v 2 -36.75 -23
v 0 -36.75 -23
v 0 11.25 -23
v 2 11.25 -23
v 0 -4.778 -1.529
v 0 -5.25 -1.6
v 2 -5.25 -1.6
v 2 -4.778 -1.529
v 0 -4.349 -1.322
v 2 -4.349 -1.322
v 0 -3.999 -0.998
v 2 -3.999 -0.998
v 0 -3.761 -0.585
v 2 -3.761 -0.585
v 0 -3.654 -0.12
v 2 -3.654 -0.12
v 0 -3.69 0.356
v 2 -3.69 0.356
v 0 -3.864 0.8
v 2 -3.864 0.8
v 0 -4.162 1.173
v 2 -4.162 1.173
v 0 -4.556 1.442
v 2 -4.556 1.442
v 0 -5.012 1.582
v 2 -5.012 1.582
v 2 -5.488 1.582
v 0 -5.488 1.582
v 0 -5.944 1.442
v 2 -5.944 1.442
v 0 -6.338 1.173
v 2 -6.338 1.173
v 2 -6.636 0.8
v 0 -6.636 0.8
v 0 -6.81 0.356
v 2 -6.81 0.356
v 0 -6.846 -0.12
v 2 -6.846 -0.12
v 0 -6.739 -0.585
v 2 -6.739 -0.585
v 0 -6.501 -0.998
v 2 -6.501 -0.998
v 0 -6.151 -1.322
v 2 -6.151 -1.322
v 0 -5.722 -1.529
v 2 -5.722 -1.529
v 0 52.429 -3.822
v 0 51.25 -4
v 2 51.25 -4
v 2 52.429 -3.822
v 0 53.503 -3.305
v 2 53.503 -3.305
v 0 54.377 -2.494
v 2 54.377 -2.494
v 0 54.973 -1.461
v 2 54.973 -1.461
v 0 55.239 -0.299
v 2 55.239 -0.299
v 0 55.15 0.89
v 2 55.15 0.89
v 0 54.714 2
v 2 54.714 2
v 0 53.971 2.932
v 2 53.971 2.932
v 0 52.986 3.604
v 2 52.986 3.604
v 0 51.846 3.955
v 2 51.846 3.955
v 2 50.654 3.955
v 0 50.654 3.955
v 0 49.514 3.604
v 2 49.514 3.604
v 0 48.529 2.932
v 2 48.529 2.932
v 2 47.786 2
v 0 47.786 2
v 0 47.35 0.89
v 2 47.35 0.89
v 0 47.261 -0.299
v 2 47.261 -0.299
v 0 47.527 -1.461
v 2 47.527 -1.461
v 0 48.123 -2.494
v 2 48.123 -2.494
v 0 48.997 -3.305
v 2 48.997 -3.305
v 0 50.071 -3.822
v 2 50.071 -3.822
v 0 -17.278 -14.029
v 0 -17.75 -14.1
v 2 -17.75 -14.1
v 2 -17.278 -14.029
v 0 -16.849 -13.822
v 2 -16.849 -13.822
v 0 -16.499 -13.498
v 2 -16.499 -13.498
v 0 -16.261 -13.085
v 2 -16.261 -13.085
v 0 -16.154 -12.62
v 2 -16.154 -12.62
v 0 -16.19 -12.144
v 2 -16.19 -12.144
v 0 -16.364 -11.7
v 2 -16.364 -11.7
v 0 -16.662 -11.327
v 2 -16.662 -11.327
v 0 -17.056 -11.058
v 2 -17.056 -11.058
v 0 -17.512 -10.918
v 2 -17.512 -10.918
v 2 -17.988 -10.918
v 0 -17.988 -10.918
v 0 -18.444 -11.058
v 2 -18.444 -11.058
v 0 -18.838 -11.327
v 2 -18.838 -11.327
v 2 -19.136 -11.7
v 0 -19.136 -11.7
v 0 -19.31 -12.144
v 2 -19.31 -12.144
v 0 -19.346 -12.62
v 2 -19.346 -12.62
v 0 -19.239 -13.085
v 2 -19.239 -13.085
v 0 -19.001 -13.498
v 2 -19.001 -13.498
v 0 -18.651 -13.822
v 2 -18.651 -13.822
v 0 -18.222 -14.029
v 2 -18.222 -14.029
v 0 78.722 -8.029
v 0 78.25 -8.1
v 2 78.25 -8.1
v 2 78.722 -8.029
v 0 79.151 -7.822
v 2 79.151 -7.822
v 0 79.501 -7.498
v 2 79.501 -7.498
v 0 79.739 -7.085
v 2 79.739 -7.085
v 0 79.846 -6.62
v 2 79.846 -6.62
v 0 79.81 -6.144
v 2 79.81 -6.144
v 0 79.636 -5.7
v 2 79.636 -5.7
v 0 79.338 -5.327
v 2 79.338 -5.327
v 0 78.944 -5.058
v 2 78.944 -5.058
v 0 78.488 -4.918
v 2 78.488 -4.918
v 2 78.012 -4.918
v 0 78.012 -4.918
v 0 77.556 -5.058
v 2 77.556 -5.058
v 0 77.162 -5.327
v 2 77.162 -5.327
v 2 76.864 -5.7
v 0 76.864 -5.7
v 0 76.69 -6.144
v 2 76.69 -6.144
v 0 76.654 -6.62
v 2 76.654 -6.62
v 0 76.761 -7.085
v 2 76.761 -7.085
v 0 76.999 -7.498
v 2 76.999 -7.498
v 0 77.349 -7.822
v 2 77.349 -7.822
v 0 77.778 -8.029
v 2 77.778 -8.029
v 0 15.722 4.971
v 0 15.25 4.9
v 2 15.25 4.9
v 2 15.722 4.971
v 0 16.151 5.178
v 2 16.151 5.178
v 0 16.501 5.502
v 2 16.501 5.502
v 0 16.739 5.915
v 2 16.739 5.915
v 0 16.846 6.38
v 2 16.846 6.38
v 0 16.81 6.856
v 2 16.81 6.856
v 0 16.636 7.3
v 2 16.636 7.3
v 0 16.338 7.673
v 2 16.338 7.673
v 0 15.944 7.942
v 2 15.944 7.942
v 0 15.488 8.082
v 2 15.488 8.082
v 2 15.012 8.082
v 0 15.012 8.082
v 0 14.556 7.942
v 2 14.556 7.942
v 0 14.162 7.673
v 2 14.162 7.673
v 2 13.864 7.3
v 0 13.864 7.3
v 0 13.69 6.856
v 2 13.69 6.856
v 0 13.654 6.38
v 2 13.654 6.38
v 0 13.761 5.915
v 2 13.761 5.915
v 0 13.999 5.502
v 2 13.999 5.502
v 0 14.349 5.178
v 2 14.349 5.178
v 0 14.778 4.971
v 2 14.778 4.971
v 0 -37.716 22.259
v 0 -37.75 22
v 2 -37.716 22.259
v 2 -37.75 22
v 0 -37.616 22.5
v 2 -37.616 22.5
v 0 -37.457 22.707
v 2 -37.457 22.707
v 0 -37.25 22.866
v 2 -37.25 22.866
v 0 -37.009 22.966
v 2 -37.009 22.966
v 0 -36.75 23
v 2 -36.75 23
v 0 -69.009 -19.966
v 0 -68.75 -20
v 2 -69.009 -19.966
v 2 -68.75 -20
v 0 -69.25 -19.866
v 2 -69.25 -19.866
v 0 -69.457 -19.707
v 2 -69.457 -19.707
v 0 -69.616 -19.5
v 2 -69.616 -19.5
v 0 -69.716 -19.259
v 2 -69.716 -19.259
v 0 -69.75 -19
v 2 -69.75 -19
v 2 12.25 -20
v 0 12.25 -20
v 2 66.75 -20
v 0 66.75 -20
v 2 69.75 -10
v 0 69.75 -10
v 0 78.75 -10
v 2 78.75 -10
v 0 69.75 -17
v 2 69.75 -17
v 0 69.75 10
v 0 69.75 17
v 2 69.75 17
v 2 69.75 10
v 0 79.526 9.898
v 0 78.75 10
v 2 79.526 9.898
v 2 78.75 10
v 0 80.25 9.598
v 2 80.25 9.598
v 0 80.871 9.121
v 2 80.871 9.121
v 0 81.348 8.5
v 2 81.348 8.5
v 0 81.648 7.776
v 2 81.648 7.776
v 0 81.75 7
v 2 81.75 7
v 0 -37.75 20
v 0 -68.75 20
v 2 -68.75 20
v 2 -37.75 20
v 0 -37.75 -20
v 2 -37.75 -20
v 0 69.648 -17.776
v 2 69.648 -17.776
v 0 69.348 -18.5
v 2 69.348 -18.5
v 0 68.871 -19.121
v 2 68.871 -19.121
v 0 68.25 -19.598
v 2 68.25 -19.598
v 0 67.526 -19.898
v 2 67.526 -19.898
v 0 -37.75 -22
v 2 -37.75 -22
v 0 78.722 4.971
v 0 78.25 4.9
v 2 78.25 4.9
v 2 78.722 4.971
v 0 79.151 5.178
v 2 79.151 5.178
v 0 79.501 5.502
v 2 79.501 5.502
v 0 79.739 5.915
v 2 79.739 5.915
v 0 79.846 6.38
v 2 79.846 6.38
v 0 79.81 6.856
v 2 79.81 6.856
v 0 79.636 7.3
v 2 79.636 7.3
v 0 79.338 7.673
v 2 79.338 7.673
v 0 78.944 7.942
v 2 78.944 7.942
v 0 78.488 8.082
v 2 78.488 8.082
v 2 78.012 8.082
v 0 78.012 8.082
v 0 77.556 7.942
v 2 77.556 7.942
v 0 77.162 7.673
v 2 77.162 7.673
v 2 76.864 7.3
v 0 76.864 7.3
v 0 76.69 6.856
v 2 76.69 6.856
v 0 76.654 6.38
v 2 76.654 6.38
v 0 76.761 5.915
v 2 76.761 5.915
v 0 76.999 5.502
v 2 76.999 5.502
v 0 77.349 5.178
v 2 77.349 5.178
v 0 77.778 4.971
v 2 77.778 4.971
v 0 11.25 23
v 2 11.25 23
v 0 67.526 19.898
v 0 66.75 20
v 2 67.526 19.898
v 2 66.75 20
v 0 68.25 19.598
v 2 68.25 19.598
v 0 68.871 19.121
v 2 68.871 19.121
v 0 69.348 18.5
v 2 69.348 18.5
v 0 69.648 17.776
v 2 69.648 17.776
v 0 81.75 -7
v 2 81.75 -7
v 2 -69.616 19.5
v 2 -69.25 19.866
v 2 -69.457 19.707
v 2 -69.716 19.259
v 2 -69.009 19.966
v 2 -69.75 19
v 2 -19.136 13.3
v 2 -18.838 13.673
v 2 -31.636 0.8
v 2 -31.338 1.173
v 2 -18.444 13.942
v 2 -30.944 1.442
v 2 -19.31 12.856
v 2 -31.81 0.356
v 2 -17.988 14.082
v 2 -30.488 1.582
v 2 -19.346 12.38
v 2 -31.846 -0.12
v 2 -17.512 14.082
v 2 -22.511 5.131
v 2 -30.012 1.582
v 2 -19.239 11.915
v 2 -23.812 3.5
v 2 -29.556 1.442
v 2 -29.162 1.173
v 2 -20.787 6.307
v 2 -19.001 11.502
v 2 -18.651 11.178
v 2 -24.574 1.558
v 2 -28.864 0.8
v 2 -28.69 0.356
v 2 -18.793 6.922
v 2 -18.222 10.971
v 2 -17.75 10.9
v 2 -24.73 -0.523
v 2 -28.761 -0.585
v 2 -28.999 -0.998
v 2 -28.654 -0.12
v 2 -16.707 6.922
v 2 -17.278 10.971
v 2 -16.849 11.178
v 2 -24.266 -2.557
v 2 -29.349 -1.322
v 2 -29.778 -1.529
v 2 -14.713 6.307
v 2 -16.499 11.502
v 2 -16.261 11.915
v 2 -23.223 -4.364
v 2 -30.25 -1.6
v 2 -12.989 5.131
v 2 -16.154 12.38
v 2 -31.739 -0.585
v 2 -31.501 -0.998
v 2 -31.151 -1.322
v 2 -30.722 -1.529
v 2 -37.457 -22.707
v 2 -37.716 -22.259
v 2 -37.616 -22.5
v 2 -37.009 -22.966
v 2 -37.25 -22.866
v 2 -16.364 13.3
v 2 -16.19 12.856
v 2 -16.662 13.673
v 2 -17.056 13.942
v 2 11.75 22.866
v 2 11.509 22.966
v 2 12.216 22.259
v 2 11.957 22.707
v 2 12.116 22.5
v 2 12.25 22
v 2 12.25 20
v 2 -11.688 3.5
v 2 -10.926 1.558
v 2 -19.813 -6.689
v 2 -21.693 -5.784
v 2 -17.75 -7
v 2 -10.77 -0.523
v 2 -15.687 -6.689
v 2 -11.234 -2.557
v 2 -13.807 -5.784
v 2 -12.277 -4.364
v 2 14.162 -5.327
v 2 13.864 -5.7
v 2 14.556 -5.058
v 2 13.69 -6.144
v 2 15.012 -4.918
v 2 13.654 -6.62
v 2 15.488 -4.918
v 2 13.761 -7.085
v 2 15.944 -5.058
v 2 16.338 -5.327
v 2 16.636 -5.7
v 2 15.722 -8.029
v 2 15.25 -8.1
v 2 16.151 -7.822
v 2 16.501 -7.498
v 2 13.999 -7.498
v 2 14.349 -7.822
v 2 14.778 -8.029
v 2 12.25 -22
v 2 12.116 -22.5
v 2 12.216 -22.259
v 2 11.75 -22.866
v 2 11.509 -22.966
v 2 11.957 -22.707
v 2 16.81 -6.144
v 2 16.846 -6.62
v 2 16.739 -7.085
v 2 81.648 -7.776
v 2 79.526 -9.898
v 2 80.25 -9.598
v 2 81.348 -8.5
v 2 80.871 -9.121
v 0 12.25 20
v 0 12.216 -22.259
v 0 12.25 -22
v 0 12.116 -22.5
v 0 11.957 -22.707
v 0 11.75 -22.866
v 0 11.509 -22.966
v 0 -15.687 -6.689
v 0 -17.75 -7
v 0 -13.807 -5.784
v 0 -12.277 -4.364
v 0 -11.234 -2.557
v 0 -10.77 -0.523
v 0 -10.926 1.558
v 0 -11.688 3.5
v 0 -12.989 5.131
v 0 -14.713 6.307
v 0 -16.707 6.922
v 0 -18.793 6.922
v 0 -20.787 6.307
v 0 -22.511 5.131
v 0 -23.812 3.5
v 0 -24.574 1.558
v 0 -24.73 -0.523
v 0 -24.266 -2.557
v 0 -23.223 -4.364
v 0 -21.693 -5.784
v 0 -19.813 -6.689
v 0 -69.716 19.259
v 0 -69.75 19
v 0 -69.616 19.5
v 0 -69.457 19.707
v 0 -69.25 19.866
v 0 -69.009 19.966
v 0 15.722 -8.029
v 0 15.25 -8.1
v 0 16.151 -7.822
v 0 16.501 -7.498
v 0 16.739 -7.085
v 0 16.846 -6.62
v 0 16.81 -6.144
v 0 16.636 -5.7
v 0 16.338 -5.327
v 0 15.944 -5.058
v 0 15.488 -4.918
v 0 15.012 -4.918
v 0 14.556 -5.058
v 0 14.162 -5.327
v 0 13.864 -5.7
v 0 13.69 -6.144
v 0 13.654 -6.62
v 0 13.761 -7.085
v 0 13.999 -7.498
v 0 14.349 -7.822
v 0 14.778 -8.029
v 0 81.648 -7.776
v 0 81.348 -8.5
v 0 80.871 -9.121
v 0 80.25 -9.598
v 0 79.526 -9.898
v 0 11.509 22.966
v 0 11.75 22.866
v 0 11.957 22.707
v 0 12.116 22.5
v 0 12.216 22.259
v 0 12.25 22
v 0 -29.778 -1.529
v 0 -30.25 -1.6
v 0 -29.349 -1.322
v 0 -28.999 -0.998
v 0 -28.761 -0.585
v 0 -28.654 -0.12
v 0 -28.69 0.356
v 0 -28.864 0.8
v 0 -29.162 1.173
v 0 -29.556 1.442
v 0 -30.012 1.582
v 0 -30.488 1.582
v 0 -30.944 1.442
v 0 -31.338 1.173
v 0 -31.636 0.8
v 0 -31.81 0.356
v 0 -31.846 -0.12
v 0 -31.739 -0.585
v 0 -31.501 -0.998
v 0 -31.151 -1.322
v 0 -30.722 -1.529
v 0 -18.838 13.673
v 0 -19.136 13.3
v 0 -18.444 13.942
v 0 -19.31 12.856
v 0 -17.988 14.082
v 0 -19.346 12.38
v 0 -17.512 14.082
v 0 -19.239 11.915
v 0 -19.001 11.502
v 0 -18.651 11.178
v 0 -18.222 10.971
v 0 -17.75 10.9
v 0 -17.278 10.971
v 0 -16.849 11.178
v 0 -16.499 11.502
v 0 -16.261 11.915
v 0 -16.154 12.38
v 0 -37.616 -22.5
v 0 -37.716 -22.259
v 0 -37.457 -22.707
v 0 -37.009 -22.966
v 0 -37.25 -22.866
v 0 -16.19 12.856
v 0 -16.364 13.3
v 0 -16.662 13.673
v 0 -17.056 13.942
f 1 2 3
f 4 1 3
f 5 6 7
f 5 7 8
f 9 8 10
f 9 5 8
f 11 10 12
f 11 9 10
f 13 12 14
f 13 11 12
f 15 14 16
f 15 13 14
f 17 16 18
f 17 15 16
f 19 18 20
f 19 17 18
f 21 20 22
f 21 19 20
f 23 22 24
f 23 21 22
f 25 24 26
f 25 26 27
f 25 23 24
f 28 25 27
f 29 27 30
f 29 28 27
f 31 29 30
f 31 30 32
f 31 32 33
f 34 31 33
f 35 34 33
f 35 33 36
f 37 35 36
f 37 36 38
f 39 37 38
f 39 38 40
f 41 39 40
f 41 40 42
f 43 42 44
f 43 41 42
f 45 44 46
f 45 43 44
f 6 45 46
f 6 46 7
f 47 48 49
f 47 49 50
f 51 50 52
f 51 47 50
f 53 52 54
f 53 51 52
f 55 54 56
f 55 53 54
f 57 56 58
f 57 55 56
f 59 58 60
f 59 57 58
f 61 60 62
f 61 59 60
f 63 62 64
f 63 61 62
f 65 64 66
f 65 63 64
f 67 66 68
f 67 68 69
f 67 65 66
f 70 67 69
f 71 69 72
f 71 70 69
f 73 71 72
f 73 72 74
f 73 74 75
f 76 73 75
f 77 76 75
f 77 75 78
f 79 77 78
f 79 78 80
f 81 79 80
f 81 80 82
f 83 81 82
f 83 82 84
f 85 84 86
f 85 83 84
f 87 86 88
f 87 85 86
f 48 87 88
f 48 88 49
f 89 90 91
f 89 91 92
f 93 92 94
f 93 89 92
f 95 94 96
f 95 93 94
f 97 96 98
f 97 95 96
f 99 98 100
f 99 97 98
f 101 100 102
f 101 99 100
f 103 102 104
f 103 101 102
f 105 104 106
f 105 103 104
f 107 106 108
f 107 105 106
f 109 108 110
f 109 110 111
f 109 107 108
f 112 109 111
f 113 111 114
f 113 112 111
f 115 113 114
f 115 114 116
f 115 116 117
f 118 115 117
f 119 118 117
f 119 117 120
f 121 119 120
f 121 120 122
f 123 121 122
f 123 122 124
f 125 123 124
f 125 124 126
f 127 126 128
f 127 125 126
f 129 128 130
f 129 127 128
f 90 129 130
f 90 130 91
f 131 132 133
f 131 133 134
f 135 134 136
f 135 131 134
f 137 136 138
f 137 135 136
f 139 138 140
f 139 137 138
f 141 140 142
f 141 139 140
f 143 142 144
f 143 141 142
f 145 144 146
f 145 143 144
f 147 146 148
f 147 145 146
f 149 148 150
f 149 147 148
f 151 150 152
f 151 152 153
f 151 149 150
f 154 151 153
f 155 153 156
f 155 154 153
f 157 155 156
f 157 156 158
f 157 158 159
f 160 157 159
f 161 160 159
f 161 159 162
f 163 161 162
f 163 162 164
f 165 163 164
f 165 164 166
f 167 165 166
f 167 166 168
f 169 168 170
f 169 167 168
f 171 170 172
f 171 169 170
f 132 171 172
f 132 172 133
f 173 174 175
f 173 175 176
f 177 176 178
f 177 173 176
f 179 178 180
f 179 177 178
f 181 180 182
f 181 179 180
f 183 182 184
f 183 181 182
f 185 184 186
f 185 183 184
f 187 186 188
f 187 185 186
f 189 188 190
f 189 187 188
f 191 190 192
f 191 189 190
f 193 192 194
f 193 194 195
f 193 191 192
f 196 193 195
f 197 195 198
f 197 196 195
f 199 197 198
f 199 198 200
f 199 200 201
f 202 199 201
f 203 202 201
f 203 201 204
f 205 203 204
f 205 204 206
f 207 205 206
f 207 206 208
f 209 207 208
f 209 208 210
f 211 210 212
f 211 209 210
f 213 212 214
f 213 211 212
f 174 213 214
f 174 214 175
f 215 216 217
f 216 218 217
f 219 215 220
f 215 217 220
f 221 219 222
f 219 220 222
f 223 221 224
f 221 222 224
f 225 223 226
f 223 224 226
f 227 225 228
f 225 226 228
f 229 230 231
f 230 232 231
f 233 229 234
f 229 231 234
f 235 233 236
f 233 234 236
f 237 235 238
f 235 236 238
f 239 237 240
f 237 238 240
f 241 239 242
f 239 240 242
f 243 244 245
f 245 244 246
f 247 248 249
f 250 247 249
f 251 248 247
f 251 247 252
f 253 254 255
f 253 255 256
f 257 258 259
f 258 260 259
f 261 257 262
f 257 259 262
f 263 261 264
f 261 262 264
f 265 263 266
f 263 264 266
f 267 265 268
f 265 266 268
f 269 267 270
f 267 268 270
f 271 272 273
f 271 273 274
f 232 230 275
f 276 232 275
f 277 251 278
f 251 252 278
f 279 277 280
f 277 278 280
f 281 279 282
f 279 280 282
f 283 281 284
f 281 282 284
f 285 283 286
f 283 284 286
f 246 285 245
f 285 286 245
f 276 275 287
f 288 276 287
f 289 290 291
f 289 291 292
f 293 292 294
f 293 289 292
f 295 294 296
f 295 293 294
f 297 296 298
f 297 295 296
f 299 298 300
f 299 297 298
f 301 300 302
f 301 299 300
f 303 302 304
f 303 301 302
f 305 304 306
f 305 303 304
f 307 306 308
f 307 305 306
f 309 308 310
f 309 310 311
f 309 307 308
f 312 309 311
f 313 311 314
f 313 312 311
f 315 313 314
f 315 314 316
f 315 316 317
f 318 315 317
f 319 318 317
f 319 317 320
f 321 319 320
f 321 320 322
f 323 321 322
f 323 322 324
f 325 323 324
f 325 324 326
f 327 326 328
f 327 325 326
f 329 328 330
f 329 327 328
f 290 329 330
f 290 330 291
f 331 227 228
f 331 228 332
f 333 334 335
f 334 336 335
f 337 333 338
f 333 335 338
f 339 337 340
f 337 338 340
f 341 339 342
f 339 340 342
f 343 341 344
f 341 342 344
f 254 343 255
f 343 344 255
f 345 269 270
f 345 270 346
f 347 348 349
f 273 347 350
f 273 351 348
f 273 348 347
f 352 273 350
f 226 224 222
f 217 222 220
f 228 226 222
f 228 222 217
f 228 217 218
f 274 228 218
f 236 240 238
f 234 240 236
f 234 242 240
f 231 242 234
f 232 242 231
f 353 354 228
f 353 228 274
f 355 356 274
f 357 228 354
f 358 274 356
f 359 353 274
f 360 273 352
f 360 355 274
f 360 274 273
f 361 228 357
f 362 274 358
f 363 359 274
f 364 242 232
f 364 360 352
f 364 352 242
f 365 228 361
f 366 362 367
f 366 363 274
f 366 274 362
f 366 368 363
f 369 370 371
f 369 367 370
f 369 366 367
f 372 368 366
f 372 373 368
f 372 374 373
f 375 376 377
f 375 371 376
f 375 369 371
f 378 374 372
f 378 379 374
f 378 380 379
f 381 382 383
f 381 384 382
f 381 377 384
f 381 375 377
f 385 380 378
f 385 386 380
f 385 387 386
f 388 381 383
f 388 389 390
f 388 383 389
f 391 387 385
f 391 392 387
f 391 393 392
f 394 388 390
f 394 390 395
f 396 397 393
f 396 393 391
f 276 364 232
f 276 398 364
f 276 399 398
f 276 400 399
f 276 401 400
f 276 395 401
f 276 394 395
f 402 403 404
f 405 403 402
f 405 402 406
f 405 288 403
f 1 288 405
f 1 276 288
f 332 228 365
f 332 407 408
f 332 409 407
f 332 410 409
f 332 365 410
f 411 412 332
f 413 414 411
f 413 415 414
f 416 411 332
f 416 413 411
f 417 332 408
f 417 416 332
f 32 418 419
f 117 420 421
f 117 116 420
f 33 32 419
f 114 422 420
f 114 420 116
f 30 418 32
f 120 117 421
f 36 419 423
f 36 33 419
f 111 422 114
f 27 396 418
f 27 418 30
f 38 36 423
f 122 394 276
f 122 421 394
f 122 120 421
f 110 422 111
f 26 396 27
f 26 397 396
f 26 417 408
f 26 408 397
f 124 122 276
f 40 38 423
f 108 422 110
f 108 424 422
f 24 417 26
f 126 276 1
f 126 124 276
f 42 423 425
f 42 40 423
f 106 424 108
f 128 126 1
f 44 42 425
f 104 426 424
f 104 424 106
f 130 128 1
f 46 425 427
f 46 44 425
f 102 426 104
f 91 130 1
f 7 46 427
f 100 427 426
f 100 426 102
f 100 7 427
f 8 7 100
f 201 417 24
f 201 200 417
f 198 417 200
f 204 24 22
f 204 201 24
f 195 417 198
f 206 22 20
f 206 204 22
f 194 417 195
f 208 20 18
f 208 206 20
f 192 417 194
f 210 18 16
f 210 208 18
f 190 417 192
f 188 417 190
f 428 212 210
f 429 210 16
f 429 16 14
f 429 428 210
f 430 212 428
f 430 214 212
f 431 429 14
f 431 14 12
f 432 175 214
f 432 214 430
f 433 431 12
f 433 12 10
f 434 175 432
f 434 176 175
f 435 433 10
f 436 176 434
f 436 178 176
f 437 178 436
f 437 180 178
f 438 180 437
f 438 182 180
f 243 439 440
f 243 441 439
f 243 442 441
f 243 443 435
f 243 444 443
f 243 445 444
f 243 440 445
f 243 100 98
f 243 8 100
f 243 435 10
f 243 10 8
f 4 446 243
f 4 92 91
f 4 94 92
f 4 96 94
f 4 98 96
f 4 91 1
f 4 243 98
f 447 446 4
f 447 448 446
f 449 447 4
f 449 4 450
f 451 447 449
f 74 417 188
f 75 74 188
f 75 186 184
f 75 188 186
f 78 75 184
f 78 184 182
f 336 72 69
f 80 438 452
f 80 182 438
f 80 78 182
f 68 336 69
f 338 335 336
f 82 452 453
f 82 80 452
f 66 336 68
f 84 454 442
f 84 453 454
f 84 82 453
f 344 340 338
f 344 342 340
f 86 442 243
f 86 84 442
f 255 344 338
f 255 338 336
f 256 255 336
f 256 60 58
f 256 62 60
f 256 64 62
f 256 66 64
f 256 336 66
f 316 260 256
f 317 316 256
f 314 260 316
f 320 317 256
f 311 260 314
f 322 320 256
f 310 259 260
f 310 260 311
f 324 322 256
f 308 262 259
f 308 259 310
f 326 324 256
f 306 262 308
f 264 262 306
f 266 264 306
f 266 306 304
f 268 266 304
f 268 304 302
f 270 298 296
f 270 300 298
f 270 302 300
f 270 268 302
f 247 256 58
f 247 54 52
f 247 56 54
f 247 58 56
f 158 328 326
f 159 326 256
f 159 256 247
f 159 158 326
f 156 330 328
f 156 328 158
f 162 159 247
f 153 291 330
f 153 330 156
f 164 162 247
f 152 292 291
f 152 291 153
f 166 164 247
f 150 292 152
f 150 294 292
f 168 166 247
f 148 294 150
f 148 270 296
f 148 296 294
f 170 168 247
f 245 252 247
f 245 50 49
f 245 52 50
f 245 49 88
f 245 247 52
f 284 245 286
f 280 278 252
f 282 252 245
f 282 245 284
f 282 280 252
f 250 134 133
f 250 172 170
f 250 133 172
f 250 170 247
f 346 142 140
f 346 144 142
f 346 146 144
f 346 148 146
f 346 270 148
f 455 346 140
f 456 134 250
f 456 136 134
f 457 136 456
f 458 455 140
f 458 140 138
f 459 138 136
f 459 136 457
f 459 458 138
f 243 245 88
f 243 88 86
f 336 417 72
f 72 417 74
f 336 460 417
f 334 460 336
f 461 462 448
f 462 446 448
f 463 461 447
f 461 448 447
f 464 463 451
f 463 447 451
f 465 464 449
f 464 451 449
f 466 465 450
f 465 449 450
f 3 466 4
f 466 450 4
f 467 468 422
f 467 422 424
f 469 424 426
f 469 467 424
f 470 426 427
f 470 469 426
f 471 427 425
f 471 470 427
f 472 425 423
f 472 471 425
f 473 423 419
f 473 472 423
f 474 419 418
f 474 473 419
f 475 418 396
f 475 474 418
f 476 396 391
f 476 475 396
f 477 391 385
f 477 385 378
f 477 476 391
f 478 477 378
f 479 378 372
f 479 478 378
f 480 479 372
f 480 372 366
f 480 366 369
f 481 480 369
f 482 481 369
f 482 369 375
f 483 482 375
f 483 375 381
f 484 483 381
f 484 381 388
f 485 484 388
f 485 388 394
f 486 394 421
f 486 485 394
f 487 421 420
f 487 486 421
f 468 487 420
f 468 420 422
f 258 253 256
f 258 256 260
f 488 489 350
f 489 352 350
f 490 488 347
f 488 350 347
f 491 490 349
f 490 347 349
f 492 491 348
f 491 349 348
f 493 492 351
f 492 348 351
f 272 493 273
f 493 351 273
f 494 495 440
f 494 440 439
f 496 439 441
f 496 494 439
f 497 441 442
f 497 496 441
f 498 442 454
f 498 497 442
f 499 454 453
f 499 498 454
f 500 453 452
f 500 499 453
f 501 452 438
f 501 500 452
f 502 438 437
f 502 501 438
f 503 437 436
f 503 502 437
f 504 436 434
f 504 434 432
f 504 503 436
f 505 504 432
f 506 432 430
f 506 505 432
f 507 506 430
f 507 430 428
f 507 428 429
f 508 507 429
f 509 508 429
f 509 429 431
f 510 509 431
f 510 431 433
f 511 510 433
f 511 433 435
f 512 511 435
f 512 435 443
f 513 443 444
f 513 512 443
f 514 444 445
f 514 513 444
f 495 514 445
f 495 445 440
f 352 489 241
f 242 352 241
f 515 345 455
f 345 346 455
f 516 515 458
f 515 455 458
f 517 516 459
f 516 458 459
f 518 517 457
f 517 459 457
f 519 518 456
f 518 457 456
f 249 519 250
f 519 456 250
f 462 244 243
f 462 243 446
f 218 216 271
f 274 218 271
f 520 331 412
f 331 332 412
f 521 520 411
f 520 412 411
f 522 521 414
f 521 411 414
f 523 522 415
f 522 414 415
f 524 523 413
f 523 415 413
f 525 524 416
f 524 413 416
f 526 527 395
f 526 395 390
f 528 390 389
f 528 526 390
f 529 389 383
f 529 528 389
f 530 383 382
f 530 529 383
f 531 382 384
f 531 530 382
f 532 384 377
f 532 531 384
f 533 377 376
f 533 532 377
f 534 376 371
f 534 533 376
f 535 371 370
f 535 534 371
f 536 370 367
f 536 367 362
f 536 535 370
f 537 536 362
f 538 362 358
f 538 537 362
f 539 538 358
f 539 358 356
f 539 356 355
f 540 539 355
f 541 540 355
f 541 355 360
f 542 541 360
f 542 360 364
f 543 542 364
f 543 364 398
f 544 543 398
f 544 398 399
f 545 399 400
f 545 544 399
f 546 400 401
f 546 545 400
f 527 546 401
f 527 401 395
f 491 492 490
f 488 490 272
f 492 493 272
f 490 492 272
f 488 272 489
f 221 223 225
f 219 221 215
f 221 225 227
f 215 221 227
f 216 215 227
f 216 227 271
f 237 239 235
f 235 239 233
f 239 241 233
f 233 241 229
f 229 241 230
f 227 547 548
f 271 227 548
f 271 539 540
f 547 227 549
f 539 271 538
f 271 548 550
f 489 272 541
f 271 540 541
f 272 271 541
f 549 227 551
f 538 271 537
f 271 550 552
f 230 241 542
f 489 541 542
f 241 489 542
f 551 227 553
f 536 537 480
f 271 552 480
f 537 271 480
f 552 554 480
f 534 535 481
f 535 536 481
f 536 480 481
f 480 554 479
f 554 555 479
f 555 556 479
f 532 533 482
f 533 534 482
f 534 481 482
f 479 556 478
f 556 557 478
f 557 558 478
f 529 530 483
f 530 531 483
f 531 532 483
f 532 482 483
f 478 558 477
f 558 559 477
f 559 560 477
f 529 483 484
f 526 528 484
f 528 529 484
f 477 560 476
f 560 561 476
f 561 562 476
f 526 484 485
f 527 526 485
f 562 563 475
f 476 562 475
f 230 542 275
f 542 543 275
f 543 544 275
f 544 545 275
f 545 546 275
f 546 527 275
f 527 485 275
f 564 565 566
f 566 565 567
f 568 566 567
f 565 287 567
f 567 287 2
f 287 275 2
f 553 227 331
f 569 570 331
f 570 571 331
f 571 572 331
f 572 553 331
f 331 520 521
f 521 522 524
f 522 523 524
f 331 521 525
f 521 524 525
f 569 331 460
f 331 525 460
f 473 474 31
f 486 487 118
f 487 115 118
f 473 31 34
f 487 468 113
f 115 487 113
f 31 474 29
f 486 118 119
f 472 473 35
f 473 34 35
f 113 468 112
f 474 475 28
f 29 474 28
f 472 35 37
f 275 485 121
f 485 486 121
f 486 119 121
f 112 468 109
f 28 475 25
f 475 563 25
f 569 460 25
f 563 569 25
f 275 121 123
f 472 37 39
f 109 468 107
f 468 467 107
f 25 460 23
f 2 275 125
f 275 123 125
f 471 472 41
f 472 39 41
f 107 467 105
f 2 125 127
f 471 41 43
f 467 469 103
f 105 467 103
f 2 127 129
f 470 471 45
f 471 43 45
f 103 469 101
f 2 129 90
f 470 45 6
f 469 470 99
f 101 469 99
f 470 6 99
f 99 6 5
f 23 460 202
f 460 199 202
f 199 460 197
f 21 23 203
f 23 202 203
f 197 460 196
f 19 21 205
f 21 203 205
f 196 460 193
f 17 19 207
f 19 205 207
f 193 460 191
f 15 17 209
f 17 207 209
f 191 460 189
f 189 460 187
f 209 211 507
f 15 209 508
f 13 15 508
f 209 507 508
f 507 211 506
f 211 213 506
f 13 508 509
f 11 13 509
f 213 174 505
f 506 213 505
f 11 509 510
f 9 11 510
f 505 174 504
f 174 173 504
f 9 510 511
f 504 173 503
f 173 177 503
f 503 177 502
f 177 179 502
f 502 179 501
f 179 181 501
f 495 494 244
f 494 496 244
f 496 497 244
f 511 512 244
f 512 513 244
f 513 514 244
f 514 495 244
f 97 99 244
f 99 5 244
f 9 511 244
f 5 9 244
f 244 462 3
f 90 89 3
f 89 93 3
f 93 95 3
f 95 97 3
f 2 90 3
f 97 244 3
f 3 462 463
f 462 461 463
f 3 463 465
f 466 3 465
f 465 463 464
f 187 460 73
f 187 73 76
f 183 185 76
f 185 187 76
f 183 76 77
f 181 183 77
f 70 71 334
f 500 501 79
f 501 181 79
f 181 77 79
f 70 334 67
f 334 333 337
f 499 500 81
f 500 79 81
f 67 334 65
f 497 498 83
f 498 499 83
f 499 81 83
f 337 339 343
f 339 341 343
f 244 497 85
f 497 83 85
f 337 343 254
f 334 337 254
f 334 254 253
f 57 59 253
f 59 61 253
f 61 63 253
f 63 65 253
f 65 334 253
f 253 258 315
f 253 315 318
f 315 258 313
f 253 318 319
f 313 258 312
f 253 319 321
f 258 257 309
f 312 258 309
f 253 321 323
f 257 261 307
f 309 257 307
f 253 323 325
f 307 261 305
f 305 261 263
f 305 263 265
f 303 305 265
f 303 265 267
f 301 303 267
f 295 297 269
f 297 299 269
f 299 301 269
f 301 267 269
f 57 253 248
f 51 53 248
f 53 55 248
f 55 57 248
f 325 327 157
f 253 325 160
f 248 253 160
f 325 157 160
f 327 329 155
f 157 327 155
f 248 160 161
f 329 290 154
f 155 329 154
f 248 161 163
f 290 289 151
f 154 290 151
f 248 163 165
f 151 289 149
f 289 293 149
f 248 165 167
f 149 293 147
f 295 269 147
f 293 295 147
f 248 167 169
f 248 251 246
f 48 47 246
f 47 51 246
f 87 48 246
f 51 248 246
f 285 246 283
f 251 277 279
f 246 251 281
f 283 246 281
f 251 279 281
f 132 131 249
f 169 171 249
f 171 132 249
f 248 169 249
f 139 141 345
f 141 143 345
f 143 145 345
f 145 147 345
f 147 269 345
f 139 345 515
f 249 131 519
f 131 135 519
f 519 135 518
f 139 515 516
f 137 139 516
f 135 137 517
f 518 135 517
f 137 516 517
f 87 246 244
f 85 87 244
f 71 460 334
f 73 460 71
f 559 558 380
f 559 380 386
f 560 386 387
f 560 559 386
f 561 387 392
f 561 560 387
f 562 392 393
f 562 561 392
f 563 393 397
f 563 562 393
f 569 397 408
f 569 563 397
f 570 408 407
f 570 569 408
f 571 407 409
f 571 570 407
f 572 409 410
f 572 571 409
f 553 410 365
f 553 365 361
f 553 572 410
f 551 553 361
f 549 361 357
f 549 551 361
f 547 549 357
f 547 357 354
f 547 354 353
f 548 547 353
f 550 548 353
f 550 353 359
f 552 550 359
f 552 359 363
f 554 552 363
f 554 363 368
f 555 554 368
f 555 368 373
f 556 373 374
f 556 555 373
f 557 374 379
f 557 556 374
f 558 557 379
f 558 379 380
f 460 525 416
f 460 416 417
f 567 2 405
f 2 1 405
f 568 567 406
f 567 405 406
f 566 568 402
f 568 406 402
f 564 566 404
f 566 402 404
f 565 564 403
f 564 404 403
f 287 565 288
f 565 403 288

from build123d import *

# Parameters (mm, degrees)
SKETCH_1_W      = 40
SKETCH_1_H      = 139.5
SKETCH_1_R      = 7
SKETCH_1_R_2    = 1.6
SKETCH_1_R_3    = 4
SKETCH_1_W_2    = 20
SKETCH_1_H_2    = 12
SKETCH_1_W_3    = 3
SKETCH_1_H_3    = 50
EXTRUDE_1_DEPTH = 2
FILLET_1_R      = 3
FILLET_2_R      = 1


with BuildPart() as part:
    # 草图1 → 凸台-拉伸1 (new body)
    # profile 1 of 4: a face of its own
    with BuildSketch(Plane(origin=(0, 0, 0), x_dir=(0, 0, -1), z_dir=(1, 0, 0))):
        Rectangle(SKETCH_1_W, SKETCH_1_H)
        with Locations((0, -17.75)):
            Circle(SKETCH_1_R, mode=Mode.SUBTRACT)
        with Locations((0, -5.25)):
            Circle(SKETCH_1_R_2, mode=Mode.SUBTRACT)
        with Locations((12.5, -17.75)):
            Circle(SKETCH_1_R_2, mode=Mode.SUBTRACT)
        with Locations((0, -30.25)):
            Circle(SKETCH_1_R_2, mode=Mode.SUBTRACT)
        with Locations((-12.5, -17.75)):
            Circle(SKETCH_1_R_2, mode=Mode.SUBTRACT)
        with Locations((-6.5, 15.25)):
            Circle(SKETCH_1_R_2, mode=Mode.SUBTRACT)
        with Locations((6.5, 15.25)):
            Circle(SKETCH_1_R_2, mode=Mode.SUBTRACT)
        with Locations((0, 51.25)):
            Circle(SKETCH_1_R_3, mode=Mode.SUBTRACT)
    # profile 2 of 4: a face of its own
    with BuildSketch(Plane(origin=(0, 0, 0), x_dir=(0, 0, -1), z_dir=(1, 0, 0))):
        with Locations((0, 75.75)):
            Rectangle(SKETCH_1_W_2, SKETCH_1_H_2)
        with Locations((-6.5, 78.25)):
            Circle(SKETCH_1_R_2, mode=Mode.SUBTRACT)
        with Locations((6.5, 78.25)):
            Circle(SKETCH_1_R_2, mode=Mode.SUBTRACT)
    # profile 3 of 4: a face of its own
    with BuildSketch(Plane(origin=(0, 0, 0), x_dir=(0, 0, -1), z_dir=(1, 0, 0))):
        with Locations((21.5, -12.75)):
            Rectangle(SKETCH_1_W_3, SKETCH_1_H_3)
    # profile 4 of 4: a face of its own
    with BuildSketch(Plane(origin=(0, 0, 0), x_dir=(0, 0, -1), z_dir=(1, 0, 0))):
        with Locations((-21.5, -12.75)):
            Rectangle(SKETCH_1_W_3, SKETCH_1_H_3)
    extrude(amount=EXTRUDE_1_DEPTH)

    # 圆角1
    fillet_1_edges = [part.edges().sort_by_distance(p)[0] for p in [
        (1, 69.75, 20),
        (1, 81.75, 10),
        (1, 81.75, -10),
        (1, 69.75, -20),
    ]]
    fillet(fillet_1_edges, radius=FILLET_1_R)

    # 圆角2
    fillet_2_edges = [part.edges().sort_by_distance(p)[0] for p in [
        (1, -69.75, 20),
        (1, -37.75, 23),
        (1, 12.25, 23),
        (1, 12.25, -23),
        (1, -37.75, -23),
        (1, -69.75, -20),
    ]]
    fillet(fillet_2_edges, radius=FILLET_2_R)


solid = part.part
